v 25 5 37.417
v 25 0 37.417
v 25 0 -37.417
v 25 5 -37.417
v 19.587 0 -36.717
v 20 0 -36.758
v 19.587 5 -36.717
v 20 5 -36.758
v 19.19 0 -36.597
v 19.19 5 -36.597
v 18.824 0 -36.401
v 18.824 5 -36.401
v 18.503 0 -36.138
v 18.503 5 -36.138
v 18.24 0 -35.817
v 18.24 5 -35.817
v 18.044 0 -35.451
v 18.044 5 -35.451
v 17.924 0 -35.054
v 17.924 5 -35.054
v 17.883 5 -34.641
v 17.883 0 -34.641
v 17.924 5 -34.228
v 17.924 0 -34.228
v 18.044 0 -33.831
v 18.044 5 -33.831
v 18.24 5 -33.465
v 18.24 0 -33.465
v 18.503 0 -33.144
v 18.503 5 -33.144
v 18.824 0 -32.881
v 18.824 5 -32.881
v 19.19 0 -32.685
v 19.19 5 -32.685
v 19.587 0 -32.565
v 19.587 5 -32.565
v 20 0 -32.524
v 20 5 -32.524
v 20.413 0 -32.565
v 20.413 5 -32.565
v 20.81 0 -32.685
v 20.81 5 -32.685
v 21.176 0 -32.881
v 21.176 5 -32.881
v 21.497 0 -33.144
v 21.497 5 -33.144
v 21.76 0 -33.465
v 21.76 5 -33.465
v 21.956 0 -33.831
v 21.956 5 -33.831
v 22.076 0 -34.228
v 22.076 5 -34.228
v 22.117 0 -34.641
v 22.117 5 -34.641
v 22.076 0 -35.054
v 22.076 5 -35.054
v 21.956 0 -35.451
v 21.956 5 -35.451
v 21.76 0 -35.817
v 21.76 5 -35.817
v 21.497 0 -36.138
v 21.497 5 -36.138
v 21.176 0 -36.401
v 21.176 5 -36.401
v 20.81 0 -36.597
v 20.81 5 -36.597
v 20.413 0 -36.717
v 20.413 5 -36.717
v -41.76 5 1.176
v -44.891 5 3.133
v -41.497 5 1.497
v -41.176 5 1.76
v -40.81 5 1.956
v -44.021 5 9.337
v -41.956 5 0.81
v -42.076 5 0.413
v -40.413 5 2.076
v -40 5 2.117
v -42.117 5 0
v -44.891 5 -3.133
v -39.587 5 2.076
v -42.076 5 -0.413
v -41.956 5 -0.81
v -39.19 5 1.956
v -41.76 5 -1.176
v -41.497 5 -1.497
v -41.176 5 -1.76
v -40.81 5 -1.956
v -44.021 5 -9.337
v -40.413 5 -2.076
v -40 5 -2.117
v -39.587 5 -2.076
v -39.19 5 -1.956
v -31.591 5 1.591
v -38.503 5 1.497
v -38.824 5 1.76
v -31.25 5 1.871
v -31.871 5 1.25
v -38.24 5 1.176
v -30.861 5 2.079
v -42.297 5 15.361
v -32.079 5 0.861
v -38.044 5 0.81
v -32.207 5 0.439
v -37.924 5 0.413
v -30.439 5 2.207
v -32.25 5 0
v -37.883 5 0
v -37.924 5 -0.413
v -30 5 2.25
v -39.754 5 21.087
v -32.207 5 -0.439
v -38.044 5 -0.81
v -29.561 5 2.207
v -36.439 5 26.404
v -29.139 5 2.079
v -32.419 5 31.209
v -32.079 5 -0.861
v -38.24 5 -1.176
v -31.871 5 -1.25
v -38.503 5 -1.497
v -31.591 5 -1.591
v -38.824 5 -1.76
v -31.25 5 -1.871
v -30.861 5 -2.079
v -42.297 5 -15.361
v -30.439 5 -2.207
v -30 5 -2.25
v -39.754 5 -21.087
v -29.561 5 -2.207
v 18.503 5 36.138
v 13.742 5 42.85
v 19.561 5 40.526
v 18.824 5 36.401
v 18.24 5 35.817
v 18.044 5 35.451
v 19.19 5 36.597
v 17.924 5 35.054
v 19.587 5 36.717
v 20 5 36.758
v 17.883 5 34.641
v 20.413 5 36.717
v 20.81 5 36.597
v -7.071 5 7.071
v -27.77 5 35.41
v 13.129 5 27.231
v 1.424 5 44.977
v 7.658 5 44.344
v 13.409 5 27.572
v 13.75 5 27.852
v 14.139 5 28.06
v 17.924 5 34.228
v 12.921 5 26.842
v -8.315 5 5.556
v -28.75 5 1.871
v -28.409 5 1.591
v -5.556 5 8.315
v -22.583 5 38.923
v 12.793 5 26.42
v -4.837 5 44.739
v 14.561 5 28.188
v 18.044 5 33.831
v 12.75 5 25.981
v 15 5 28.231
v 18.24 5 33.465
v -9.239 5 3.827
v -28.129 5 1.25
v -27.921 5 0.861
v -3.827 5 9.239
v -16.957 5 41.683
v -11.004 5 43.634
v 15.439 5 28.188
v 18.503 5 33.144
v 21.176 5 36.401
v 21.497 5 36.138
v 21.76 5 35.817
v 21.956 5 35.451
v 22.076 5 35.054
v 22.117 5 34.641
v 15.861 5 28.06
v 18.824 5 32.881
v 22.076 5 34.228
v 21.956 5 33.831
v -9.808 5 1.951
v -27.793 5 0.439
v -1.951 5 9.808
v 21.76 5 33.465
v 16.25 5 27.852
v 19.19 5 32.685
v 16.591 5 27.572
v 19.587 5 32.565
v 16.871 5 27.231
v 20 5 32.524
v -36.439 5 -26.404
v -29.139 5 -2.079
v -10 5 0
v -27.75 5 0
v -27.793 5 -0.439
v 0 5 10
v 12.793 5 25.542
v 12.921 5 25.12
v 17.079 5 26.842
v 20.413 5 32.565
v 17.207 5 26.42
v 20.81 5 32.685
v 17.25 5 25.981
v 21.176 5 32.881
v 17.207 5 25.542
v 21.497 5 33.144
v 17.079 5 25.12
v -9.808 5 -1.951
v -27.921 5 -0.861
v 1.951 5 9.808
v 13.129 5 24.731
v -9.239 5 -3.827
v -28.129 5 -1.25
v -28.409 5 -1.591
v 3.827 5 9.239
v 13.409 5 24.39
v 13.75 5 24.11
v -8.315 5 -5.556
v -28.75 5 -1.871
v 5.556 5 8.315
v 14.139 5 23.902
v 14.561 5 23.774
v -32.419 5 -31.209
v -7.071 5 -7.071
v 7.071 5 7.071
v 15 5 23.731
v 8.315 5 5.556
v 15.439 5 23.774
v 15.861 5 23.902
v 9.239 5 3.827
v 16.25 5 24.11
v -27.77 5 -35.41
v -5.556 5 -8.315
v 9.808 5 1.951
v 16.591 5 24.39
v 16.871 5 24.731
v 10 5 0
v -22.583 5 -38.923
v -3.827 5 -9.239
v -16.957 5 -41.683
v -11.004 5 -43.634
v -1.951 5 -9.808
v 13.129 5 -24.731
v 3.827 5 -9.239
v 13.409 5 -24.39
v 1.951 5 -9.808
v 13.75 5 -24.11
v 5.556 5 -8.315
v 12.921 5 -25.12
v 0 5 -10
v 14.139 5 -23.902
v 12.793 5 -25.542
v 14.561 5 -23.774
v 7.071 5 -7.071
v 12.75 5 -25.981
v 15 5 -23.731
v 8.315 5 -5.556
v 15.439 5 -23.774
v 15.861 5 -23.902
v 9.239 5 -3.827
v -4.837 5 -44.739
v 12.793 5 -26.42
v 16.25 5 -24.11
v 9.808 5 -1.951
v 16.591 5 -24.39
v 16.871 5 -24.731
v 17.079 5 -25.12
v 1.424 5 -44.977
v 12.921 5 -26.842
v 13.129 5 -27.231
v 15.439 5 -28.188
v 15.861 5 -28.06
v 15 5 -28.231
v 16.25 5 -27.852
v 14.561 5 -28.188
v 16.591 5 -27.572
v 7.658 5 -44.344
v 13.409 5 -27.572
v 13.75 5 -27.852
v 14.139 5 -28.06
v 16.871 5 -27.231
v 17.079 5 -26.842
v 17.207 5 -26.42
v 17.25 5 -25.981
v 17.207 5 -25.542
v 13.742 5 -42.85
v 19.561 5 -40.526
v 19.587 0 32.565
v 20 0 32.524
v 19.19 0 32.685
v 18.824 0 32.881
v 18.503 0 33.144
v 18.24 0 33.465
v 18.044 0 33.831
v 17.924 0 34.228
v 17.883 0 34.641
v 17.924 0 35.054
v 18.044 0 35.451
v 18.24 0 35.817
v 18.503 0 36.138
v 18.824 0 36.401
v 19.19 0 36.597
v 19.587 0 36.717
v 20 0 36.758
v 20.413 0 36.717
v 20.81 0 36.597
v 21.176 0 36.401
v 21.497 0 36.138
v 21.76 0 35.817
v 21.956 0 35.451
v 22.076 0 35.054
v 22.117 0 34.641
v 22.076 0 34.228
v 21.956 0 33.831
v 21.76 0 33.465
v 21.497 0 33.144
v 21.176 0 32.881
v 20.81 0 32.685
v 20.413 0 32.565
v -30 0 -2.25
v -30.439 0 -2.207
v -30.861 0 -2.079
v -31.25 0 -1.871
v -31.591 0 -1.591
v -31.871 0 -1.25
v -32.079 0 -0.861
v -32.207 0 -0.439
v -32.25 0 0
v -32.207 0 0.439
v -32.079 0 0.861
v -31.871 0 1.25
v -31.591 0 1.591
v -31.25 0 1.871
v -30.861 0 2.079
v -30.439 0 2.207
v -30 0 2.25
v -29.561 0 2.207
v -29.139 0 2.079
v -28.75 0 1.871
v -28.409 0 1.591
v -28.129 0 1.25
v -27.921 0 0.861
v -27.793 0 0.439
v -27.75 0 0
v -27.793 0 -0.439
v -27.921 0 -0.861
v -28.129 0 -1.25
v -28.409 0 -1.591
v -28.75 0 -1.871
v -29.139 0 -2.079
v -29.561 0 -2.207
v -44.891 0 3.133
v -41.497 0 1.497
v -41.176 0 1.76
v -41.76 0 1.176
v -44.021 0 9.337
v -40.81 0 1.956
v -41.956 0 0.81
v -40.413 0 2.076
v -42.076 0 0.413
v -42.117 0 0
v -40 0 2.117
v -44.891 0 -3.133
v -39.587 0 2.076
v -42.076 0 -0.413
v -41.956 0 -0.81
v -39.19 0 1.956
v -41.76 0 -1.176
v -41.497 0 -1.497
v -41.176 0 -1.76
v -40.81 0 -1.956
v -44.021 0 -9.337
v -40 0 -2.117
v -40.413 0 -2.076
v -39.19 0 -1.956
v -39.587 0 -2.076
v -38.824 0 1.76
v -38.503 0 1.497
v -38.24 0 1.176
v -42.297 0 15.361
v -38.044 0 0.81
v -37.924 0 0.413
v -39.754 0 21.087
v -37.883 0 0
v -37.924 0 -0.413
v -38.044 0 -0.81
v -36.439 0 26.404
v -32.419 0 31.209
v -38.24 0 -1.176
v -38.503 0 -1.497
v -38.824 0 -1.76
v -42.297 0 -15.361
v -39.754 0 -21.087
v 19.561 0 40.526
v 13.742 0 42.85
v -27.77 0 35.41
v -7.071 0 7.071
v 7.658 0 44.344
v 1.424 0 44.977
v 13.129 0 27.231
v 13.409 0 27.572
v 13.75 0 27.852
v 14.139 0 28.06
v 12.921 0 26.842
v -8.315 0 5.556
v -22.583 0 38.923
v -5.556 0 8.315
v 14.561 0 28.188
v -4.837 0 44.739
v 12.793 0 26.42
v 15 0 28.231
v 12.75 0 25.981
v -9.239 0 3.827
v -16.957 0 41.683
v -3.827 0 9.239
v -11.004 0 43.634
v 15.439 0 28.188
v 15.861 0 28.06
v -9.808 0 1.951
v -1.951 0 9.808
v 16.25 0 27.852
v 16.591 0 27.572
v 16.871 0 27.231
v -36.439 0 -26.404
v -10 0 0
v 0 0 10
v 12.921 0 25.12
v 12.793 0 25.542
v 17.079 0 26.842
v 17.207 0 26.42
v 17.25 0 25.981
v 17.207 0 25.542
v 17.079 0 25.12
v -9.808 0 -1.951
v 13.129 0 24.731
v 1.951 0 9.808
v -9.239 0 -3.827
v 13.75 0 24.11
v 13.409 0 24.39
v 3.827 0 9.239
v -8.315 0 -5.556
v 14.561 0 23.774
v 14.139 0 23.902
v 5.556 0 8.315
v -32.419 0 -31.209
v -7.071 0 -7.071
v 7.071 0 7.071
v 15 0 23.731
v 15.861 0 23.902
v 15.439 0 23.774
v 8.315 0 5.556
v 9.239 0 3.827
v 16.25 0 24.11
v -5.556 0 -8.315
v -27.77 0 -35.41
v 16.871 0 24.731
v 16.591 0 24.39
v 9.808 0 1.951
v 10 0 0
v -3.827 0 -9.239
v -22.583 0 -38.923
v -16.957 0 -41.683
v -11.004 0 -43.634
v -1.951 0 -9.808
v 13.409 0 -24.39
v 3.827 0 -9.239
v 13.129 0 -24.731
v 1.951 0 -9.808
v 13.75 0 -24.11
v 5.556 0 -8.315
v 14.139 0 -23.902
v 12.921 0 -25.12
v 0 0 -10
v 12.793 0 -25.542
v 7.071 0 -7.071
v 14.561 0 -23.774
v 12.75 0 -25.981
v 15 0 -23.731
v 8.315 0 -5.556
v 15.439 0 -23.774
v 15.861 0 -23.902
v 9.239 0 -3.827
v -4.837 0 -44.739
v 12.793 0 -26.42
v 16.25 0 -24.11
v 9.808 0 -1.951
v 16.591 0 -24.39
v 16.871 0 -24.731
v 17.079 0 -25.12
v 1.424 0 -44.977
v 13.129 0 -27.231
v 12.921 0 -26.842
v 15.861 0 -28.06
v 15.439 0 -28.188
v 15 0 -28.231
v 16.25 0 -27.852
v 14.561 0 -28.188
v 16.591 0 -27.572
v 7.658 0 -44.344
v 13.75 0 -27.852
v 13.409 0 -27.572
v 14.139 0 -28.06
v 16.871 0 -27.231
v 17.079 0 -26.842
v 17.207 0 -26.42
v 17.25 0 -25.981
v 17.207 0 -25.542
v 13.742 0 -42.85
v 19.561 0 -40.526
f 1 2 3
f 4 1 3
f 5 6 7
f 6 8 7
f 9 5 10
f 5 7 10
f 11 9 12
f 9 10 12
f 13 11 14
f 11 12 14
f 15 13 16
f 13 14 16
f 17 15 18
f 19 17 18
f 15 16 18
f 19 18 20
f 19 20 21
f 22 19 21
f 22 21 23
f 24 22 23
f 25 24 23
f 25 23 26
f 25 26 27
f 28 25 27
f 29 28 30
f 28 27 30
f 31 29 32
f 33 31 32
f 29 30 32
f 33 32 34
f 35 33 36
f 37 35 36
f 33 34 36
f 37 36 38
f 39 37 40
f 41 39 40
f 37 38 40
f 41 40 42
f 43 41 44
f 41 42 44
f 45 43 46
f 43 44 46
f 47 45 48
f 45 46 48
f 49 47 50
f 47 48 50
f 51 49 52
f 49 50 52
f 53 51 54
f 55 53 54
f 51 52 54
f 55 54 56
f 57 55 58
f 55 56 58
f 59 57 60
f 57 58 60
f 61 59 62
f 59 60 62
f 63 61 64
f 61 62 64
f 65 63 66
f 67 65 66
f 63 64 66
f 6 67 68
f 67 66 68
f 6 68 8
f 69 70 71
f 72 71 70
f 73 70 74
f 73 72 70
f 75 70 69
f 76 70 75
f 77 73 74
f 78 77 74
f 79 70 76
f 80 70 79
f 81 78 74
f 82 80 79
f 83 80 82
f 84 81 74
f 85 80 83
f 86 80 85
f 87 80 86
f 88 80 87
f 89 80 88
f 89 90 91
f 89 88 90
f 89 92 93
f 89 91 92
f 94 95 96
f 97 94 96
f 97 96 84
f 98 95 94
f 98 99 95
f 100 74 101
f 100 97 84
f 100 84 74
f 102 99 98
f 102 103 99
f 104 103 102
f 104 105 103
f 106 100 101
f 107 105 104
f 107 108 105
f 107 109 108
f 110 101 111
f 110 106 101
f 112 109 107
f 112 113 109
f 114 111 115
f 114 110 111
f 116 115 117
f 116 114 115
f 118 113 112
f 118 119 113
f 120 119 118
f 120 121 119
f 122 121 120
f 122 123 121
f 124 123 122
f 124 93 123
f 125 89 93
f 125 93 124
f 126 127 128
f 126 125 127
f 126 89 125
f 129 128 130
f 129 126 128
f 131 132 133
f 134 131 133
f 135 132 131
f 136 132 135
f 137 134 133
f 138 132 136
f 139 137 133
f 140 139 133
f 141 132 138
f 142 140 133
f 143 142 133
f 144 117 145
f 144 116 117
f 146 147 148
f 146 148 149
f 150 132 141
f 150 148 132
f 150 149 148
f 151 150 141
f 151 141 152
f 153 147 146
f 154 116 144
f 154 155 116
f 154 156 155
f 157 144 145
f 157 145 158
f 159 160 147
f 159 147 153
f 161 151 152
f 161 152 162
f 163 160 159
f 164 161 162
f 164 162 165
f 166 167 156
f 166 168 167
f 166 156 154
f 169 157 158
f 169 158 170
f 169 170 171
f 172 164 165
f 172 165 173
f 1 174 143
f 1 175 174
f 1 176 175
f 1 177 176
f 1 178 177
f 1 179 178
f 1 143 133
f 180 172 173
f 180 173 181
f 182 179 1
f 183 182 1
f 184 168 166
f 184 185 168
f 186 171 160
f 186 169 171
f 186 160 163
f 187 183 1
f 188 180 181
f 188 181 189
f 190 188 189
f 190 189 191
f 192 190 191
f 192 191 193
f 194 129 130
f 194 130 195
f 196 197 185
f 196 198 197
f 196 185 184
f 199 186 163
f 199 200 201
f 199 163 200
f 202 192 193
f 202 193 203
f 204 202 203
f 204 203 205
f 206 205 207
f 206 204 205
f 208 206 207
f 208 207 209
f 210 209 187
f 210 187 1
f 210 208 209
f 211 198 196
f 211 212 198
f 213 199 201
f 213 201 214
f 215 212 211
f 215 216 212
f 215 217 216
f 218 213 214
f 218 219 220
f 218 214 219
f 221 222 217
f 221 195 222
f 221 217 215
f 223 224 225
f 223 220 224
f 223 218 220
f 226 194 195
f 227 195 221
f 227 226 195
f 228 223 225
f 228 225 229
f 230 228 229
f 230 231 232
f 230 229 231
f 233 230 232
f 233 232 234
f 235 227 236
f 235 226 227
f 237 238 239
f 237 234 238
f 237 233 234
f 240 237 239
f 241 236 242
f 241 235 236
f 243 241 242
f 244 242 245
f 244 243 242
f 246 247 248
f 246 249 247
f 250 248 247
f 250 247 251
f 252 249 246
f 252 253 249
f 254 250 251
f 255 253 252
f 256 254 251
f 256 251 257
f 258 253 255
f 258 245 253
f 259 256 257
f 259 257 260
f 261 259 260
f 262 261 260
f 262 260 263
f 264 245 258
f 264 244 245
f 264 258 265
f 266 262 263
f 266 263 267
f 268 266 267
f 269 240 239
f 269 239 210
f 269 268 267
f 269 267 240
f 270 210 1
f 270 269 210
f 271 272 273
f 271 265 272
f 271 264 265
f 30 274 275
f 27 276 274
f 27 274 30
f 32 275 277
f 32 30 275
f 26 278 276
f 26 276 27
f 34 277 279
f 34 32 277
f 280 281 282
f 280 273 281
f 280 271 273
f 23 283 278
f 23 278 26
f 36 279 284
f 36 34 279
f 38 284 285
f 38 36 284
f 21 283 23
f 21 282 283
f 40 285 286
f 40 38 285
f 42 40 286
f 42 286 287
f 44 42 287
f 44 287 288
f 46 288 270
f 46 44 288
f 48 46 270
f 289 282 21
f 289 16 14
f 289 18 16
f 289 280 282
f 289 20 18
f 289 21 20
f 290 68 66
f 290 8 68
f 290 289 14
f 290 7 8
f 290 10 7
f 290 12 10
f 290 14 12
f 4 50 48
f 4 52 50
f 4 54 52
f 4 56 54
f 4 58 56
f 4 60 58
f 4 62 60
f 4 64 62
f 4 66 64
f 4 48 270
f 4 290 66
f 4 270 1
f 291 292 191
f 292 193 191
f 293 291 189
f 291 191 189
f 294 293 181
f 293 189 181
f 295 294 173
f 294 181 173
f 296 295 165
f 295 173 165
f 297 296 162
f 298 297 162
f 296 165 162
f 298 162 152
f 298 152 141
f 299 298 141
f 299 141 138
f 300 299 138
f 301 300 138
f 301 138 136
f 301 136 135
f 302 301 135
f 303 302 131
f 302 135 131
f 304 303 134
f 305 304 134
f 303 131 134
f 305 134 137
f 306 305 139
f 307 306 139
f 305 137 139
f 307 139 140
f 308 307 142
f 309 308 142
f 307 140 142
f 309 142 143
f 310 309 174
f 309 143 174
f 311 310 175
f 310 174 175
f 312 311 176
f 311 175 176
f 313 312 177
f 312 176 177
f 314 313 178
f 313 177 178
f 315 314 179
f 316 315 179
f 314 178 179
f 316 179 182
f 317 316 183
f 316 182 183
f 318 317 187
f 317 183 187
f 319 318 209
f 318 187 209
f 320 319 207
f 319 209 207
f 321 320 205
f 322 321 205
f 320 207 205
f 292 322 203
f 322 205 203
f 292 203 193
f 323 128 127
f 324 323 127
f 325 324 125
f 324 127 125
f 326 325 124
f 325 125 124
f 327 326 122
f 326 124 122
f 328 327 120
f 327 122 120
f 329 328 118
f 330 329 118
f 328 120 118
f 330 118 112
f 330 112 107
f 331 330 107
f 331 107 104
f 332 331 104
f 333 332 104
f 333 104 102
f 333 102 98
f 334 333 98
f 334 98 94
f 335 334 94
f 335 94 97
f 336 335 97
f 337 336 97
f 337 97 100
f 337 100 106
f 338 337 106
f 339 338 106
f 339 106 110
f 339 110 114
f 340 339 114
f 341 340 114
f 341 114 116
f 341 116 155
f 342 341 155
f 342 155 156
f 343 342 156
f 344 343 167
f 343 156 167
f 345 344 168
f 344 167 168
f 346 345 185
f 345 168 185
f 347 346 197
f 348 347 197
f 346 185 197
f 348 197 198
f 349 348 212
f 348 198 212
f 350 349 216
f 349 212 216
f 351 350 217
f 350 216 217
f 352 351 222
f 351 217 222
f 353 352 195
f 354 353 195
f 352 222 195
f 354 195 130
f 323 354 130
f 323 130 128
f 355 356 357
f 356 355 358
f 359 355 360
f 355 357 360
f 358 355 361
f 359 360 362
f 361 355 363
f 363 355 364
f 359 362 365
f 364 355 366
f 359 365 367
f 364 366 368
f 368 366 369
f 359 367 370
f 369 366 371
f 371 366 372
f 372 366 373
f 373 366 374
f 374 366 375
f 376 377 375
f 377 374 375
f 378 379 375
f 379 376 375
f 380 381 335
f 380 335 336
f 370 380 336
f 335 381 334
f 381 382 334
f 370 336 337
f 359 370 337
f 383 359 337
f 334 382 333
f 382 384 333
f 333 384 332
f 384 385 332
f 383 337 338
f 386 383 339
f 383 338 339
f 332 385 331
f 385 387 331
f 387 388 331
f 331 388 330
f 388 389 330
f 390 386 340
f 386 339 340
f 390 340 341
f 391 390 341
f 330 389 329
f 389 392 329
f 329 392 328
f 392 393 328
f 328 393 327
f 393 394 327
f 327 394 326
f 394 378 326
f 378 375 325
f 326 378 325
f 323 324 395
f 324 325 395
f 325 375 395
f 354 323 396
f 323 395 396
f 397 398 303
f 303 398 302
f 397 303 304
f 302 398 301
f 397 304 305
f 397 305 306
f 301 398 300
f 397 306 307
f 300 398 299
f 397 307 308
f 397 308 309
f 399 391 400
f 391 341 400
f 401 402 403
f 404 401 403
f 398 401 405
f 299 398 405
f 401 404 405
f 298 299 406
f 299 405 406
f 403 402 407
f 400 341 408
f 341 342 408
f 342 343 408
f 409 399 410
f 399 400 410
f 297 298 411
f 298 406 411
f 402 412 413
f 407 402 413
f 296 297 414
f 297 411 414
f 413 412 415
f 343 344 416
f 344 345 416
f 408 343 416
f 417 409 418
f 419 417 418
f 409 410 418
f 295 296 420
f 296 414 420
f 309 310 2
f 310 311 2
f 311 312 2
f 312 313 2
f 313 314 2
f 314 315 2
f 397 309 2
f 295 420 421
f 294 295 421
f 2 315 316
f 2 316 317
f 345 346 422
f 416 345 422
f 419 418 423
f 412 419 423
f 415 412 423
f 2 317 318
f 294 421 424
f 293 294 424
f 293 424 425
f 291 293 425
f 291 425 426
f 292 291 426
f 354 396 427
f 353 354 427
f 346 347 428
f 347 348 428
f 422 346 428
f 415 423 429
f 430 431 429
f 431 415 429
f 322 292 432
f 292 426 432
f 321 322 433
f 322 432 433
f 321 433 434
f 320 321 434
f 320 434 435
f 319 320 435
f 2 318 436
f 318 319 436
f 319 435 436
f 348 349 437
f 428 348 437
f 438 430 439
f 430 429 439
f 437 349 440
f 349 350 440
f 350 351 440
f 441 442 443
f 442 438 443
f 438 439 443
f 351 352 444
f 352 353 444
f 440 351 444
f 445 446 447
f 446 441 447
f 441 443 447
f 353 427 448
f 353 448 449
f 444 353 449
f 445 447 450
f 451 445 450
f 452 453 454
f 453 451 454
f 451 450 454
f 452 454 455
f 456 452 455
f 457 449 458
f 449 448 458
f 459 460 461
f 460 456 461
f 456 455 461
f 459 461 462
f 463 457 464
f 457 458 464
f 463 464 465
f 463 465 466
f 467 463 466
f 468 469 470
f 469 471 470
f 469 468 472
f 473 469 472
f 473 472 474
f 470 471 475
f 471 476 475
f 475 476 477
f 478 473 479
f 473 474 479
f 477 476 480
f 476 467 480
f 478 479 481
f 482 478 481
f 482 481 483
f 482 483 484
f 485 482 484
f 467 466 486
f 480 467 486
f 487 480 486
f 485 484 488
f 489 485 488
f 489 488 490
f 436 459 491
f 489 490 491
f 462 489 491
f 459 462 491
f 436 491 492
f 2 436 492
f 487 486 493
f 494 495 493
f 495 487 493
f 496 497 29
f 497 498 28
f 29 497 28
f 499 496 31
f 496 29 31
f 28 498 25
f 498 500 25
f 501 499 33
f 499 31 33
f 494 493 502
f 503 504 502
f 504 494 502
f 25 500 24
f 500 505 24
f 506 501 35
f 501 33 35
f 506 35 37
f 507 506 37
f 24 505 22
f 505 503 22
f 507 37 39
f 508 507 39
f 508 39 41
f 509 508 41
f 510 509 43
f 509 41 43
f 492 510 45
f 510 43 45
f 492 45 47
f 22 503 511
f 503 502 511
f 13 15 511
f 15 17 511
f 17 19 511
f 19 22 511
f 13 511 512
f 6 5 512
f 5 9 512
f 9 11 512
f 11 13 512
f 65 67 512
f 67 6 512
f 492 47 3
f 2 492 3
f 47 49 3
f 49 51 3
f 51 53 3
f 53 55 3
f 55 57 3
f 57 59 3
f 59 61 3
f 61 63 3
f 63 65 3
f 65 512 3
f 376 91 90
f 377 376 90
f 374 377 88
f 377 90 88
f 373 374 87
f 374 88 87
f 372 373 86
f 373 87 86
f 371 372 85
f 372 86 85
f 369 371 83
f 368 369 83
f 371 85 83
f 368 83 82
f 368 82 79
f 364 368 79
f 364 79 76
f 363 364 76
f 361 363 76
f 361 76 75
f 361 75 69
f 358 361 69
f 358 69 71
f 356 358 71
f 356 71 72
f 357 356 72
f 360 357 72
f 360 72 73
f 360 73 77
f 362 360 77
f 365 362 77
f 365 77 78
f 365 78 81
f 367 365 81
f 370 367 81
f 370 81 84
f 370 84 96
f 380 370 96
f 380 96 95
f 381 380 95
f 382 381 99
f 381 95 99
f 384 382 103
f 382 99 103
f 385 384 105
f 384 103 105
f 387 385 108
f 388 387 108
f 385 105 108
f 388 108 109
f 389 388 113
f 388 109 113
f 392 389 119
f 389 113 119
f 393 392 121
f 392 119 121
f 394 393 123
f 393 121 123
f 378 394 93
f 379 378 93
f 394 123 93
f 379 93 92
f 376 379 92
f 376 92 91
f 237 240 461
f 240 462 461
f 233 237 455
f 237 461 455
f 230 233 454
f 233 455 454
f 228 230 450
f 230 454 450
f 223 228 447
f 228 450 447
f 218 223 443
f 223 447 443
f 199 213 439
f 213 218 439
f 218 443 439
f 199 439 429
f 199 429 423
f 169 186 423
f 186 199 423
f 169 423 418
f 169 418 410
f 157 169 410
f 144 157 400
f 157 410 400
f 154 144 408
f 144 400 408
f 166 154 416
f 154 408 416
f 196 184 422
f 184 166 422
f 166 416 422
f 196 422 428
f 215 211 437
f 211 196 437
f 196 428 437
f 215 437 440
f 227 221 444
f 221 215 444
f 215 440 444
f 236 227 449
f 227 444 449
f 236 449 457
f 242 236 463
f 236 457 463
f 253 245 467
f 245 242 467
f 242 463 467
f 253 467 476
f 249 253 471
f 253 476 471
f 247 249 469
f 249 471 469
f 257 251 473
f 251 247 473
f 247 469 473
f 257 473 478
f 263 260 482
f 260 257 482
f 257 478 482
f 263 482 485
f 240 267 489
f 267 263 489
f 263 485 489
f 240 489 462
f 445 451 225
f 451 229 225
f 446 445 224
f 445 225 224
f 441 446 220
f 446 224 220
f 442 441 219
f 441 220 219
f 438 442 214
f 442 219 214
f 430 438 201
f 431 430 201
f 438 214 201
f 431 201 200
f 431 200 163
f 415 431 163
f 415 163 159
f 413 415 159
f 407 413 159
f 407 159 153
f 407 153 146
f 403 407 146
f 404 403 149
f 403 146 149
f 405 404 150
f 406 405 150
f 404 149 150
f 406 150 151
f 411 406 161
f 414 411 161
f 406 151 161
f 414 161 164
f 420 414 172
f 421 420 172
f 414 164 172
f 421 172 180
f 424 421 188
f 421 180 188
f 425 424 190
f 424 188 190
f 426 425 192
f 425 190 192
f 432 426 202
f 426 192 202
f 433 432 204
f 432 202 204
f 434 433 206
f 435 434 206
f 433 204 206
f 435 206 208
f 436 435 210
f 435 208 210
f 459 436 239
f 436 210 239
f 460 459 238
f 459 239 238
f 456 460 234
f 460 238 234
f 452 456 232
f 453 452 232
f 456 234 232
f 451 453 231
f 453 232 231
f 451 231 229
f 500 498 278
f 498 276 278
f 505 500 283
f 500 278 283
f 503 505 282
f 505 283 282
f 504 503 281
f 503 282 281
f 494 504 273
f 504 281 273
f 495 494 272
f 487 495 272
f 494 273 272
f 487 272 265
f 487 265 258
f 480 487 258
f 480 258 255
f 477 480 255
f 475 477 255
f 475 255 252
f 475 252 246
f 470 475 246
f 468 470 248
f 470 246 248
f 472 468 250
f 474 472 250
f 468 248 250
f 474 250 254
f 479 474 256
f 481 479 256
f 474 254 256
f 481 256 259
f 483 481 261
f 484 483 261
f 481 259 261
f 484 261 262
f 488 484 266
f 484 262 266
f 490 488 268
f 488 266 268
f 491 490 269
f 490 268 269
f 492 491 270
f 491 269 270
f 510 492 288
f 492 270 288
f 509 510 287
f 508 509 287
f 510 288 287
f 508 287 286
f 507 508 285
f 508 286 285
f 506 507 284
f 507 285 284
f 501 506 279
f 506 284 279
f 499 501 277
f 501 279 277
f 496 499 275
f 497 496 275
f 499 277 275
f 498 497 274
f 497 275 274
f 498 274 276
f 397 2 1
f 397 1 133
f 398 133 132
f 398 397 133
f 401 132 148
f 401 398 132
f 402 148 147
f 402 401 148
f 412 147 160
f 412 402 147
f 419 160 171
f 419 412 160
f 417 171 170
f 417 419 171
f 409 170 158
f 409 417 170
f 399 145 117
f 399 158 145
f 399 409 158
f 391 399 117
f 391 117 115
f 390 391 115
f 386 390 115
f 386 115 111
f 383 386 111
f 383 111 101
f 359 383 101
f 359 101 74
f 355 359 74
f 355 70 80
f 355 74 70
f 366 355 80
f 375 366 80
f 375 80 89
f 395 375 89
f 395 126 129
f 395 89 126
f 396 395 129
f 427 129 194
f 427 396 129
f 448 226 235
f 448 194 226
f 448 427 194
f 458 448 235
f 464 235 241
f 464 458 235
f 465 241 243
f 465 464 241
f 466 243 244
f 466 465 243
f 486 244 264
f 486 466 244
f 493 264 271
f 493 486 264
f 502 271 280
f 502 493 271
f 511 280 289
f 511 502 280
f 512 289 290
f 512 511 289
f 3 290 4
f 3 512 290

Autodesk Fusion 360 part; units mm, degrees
sketch "Sketch1" plane through (0, 0, 0) normal (0, 1, 0) x (1, 0, 0)
  circle A0 centre (0, 0) radius 50
  circle A1 centre (0, 0) radius 30 construction
  circle A2 centre (0, 0) radius 10
  circle A3 centre (0, 0) radius 45
  circle A4 centre (0, 0) radius 40 construction
  line L0 (25, -37.4166) -> (25, 37.4166)
  point P0 (-30, 0)
  point P1 (15, -25.9808)
  point P2 (15, 25.9808)
  point P3 (-40, 0)
  point P4 (20, -34.641)
  point P5 (20, 34.641)
  dimension "d1" = 100
  dimension "d2" = 60
  dimension "d3" = 20
  dimension "d4" = -5
  dimension "d6" = 360
  dimension "d14" = 80
  dimension "d18" = 5
extrude "Extrude1" add sketch "Sketch1" along normal blind 5 contours A3 L0 picked at (20, 0)
hole "Hole1" at (15, 0, 25.9808) at (15, 0, -25.9808) at (-30, 0, 0) direction (0, 1, 0) diameter 4.5 depth 7 tip angle 118
hole "Hole2" at (-40, 0, 0) at (20, 0, 34.641) at (20, 0, -34.641) direction (0, 1, 0) diameter 4.234 depth 25 tip angle 118
